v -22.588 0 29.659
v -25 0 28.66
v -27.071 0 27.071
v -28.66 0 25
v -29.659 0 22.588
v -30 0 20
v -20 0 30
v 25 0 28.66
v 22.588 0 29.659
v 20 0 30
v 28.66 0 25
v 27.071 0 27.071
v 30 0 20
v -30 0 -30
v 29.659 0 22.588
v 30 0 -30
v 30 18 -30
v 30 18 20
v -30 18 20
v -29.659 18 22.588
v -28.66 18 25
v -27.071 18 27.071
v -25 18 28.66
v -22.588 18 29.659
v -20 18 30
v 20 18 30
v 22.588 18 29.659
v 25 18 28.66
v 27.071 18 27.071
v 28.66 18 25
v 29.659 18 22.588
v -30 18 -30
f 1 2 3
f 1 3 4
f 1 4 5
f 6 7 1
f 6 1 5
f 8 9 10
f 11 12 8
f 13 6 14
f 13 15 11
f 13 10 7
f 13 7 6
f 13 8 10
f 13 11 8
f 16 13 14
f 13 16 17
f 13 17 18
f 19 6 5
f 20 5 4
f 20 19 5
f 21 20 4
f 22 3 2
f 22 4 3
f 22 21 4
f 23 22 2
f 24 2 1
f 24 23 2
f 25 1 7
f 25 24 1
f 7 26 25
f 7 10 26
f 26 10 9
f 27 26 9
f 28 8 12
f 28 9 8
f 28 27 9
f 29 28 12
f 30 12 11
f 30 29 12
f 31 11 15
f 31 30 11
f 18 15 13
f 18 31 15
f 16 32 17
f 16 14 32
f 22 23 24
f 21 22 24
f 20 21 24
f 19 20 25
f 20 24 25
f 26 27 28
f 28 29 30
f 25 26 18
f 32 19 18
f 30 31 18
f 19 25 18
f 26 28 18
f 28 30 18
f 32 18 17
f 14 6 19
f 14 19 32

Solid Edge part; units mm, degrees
sketch "Sketch1" plane through (0, 0, 0) normal (0, -1, 0) x (1, 0, 0)
  line L0 (30, -30) -> (30, 30)
  line L1 (30, 30) -> (-30, 30)
  line L2 (-30, 30) -> (-30, -30)
  line L3 (-30, -30) -> (30, -30)
extrude "Protrusion1" add sketch "Sketch1" against normal blind 18
fillet "Round1" radius 10 2 edges at (-30, 9, 30) (30, 9, 30)
